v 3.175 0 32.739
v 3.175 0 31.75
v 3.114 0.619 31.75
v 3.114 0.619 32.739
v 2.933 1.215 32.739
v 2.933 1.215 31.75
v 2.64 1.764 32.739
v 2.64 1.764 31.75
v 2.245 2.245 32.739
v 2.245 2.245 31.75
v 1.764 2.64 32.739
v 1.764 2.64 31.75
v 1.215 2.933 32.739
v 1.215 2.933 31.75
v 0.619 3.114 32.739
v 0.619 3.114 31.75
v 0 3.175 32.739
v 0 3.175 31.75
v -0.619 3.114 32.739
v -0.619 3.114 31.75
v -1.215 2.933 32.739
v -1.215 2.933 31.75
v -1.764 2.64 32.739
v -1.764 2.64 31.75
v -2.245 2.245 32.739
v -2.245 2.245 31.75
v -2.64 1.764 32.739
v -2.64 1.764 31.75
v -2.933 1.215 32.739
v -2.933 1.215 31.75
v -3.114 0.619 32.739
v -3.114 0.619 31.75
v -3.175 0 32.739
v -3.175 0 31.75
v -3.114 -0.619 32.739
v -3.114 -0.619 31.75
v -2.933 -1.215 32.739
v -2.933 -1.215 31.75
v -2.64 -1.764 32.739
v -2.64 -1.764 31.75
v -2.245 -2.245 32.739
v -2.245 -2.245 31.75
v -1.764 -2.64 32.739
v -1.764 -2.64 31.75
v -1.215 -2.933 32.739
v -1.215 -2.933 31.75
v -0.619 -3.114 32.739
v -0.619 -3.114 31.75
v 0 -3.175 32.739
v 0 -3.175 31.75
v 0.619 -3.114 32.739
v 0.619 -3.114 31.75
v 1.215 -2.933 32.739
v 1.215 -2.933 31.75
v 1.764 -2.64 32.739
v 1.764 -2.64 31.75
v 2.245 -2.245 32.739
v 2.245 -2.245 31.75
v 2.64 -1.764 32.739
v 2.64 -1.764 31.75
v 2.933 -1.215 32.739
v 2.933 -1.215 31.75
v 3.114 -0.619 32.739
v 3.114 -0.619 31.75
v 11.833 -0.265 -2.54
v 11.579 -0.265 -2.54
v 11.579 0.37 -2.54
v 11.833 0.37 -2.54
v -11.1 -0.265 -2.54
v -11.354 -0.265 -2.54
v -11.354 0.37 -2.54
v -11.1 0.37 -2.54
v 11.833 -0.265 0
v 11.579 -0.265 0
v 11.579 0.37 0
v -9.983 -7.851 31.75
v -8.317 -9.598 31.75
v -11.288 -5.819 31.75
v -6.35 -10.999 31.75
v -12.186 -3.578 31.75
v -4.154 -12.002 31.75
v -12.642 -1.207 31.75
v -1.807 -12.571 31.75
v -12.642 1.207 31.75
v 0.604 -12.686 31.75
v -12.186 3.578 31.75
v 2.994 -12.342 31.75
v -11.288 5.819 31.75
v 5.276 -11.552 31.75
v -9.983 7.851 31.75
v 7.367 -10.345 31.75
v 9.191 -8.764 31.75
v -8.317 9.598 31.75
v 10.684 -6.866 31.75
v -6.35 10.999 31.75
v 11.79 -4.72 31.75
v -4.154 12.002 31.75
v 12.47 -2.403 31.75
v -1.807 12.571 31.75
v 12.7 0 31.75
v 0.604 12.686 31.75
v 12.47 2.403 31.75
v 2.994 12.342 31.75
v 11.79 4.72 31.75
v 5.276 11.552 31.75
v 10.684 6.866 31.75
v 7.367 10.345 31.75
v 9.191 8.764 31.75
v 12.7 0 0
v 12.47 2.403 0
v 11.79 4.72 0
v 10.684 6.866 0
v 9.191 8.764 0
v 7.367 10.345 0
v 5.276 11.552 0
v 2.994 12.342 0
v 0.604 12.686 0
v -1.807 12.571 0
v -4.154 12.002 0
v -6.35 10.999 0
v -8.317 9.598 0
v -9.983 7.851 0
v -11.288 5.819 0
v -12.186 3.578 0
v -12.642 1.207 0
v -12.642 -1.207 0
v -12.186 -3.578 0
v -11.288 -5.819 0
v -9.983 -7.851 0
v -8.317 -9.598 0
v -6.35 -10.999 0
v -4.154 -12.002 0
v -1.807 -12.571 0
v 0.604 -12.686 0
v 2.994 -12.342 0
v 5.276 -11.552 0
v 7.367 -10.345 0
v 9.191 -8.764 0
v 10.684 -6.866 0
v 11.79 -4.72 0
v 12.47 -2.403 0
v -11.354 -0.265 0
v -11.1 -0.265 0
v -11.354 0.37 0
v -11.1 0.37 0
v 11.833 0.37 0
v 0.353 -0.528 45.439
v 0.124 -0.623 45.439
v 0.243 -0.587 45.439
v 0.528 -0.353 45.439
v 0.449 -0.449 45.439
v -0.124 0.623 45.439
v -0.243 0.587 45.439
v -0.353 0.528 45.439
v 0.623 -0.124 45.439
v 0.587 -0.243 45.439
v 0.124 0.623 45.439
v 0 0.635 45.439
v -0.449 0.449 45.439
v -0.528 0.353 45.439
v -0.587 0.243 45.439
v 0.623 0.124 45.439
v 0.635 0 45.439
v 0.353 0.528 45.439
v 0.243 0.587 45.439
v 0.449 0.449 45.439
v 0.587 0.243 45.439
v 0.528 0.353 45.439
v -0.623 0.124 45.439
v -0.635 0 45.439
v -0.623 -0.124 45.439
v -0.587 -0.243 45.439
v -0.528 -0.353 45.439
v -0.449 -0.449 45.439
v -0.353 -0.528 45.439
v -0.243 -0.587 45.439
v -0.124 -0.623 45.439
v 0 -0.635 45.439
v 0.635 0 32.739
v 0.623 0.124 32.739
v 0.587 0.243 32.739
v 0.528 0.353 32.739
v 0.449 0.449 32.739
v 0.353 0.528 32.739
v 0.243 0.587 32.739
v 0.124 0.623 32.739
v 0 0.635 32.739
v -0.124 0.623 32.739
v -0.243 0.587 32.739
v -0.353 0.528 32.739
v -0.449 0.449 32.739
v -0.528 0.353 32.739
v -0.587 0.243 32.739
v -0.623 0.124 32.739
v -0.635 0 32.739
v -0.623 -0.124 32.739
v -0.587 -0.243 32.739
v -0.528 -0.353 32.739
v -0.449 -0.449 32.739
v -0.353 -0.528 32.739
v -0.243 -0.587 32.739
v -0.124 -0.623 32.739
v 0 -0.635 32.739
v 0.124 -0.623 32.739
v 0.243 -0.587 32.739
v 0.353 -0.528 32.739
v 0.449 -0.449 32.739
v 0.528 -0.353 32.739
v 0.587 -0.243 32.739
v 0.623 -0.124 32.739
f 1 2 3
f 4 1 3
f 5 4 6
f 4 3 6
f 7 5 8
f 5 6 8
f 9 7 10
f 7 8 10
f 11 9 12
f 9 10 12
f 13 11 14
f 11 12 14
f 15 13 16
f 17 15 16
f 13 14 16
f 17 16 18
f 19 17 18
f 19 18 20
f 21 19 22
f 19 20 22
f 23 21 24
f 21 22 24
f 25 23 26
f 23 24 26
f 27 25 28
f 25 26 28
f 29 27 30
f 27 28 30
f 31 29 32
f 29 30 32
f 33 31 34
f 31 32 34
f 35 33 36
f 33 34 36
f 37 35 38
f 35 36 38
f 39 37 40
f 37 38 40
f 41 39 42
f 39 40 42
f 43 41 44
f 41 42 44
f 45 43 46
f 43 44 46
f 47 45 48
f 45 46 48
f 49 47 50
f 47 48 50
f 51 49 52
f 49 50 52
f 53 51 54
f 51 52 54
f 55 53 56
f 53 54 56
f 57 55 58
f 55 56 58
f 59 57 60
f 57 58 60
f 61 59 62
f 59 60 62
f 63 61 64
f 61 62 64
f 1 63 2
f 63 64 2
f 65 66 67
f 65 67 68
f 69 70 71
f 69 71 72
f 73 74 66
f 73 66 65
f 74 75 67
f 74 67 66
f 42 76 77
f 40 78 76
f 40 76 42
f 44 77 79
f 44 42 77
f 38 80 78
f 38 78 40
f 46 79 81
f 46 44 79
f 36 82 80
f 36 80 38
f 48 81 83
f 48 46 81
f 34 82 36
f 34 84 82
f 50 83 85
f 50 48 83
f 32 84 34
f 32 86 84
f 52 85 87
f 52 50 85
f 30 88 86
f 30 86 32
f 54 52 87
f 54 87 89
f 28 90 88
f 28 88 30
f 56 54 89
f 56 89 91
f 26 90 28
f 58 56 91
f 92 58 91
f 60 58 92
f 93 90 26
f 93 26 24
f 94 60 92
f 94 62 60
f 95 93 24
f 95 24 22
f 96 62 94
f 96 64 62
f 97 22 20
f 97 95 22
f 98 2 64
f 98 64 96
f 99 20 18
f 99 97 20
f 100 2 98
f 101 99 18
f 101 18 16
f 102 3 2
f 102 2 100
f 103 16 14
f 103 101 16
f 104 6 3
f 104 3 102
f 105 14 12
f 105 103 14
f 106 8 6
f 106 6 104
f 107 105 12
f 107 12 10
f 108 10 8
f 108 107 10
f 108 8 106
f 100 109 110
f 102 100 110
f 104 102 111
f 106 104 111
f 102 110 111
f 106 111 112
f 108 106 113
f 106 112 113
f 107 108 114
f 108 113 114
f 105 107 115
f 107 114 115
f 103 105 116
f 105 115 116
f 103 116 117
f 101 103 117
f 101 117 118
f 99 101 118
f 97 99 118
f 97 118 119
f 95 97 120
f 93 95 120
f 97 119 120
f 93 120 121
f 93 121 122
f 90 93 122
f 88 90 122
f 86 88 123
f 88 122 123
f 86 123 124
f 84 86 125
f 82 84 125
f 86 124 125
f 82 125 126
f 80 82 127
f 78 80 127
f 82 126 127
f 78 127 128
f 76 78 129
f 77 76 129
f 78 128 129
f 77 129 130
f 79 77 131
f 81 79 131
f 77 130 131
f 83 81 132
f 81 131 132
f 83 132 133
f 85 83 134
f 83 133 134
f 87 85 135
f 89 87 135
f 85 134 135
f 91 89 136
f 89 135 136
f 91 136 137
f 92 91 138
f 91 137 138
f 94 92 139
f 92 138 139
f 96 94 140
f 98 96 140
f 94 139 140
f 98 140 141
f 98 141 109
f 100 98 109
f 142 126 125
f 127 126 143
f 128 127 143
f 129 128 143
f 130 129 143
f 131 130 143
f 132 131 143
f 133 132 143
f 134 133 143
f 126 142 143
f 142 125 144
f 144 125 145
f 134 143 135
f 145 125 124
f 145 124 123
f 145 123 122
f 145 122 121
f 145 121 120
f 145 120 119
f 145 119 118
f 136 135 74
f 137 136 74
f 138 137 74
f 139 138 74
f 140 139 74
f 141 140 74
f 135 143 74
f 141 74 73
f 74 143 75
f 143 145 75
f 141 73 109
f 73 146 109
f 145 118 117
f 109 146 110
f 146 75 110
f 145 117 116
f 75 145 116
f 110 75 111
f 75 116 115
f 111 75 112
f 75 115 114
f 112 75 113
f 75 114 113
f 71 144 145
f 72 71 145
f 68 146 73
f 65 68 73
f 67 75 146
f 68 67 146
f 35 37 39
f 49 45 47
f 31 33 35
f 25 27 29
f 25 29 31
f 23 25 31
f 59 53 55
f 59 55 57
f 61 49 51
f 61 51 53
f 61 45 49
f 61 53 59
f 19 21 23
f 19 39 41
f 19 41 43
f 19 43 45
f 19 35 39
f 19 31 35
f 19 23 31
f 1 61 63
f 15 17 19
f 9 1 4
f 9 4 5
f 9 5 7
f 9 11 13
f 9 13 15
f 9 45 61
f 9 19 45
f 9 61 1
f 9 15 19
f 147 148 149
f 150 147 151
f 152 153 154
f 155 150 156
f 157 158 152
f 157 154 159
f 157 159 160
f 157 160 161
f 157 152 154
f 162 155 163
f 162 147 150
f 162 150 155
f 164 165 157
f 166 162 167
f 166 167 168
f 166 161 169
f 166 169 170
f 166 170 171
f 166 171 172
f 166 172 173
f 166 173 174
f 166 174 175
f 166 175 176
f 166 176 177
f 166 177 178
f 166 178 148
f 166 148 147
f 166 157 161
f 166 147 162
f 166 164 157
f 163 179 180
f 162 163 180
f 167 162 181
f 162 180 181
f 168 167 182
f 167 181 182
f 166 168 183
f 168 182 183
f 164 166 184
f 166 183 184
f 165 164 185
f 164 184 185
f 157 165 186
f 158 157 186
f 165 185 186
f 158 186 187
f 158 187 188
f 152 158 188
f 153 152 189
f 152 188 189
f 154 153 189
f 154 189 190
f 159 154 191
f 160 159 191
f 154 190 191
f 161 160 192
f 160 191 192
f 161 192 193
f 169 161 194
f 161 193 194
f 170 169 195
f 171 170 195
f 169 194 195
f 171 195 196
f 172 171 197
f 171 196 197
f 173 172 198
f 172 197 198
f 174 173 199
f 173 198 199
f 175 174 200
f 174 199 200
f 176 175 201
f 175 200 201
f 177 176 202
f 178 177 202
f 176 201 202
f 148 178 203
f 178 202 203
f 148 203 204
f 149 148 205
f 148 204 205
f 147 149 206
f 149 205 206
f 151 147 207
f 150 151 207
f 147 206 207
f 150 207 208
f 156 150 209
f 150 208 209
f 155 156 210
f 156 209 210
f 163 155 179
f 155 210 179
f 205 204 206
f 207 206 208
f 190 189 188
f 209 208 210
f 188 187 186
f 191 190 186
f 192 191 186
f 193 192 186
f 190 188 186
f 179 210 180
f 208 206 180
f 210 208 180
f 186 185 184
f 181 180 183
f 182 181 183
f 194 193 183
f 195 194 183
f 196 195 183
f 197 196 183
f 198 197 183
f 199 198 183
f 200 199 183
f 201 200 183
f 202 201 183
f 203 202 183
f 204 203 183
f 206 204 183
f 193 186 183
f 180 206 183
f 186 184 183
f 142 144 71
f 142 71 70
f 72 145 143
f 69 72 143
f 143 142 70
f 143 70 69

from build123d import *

# Parameters (mm, degrees)
F0_R     = 12.7
F1_DEPTH = 31.75
F2_R     = 3.175
F3_DEPTH = 0.98905
F4_R     = 0.635
F5_DEPTH = 12.7
F6_W     = 0.254
F6_H     = 0.635
F7_DEPTH = 2.54


with BuildPart() as f1:
    # F0 (on Top) → F1 (new body)
    with BuildSketch(Plane.XY):
        Circle(F0_R)
    extrude(amount=F1_DEPTH)

    # F2 (on face) → F3 (join)
    with BuildSketch(Plane.XY.offset(31.75)):
        Circle(F2_R)
    extrude(amount=F3_DEPTH)

    # F6 (on face) → F7 (join)
    with BuildSketch(Plane(origin=(0, 0, 0), x_dir=(1, 0, 0), z_dir=(0, 0, -1))):
        with Locations((11.706186, -0.052551)):
            Rectangle(F6_W, F6_H)
        with Locations((-11.226546, -0.052551)):
            Rectangle(F6_W, F6_H)
    extrude(amount=F7_DEPTH)


with BuildPart() as f5:
    # F4 (on face) → F5 (new body)
    with BuildSketch(Plane.XY.offset(32.73905)):
        Circle(F4_R)
    extrude(amount=F5_DEPTH)


solid = Compound([f1.part, f5.part])
